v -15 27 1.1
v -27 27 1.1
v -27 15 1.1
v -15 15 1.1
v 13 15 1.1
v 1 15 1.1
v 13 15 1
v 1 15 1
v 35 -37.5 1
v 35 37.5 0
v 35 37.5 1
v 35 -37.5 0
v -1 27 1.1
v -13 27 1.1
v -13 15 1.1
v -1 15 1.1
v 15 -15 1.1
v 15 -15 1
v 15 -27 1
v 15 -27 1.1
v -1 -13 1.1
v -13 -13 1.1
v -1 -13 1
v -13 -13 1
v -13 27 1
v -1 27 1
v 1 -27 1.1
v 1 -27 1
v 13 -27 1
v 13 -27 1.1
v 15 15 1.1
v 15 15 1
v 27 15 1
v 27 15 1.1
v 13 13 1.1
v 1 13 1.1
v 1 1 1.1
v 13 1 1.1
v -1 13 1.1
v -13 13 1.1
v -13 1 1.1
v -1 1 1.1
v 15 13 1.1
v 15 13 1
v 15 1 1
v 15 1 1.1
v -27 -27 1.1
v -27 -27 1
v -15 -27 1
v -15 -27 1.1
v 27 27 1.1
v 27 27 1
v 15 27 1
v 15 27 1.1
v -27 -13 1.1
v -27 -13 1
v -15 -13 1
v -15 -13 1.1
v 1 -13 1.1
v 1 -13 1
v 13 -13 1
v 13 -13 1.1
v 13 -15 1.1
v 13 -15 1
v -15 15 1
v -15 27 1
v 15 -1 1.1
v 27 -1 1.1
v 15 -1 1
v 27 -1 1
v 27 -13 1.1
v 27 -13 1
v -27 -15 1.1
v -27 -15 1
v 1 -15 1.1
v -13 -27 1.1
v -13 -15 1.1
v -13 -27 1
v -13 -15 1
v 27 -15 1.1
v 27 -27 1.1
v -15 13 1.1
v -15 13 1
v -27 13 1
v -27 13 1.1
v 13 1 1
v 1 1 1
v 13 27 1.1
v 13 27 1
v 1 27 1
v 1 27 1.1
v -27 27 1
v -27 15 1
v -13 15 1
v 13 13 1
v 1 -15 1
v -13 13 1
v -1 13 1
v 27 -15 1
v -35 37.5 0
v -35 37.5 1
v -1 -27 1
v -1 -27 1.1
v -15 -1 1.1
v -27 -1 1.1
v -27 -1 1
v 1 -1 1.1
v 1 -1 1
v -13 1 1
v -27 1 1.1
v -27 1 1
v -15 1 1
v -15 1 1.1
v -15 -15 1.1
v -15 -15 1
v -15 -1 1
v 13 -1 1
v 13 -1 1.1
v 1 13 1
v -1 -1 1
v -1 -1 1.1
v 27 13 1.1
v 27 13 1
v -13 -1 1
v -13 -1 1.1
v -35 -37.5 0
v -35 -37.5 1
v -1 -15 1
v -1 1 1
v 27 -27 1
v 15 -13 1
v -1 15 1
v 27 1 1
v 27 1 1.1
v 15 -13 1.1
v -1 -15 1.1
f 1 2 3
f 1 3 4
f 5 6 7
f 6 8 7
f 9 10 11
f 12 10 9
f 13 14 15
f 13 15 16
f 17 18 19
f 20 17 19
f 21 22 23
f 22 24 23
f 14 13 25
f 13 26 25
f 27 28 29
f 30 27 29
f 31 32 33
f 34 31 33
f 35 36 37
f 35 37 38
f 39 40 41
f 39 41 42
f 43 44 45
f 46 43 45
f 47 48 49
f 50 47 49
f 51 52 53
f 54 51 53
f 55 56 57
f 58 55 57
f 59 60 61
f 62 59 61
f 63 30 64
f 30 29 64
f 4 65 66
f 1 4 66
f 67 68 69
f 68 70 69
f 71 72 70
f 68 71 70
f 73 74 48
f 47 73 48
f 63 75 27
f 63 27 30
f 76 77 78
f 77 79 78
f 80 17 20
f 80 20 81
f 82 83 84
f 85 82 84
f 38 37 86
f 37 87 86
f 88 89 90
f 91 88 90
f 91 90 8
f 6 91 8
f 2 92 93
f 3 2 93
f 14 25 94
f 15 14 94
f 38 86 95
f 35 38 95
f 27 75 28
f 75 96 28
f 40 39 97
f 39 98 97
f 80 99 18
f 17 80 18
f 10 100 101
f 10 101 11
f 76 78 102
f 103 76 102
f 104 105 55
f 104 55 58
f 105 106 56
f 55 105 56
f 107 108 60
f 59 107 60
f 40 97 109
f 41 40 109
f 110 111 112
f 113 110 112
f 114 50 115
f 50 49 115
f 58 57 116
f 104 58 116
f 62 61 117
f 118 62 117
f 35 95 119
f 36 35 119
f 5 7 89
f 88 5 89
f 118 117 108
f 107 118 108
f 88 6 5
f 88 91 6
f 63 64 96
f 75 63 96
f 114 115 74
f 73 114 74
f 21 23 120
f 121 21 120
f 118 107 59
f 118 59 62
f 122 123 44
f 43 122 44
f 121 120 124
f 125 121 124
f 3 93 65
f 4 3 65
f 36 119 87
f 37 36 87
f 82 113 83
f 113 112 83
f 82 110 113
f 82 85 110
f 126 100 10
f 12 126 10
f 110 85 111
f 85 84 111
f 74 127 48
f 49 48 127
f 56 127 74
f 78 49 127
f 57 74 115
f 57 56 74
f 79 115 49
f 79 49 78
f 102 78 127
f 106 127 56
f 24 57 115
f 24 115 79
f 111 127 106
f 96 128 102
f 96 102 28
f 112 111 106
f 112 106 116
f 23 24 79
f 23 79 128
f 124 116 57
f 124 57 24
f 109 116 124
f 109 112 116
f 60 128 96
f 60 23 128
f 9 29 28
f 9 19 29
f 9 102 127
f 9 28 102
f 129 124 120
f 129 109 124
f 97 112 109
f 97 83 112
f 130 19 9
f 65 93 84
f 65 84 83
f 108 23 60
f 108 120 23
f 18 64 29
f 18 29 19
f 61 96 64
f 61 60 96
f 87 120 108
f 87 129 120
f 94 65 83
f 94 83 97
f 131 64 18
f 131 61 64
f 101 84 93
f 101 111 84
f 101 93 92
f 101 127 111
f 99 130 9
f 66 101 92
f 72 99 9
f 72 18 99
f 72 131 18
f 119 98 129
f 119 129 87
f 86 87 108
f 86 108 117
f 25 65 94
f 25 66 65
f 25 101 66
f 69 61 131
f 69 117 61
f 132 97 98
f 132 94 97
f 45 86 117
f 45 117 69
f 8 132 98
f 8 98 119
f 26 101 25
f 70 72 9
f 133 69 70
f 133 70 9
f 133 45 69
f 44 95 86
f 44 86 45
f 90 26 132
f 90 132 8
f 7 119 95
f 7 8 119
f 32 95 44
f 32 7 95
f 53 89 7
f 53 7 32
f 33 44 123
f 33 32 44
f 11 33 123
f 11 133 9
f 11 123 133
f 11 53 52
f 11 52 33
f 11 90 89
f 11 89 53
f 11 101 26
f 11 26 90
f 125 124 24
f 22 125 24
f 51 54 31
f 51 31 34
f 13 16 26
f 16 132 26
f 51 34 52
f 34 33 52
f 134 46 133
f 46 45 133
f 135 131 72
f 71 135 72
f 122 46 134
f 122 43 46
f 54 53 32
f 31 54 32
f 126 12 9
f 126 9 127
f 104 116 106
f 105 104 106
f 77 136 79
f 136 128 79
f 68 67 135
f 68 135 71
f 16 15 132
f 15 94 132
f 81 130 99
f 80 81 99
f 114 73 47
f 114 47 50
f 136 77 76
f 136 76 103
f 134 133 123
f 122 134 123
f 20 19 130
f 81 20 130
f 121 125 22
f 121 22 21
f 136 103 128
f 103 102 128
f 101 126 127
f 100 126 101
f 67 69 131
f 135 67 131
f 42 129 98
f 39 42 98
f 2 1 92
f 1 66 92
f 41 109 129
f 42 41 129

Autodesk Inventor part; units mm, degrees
ref_plane "YZ Plane" through (0, 0, 0) normal (1, 0, 0) x (0, 1, 0)
ref_plane "XZ Plane" through (0, 0, 0) normal (0, 1, 0) x (-1, 0, 0)
ref_plane "XY Plane" through (0, 0, 0) normal (0, 0, 1) x (1, 0, 0)
sketch "Boceto1" plane through (0, 0, 0) normal (0, 0, 1) x (1, 0, 0)
  line L0 (-35, 37.5) -> (35, 37.5)
  line L1 (35, 37.5) -> (35, -37.5)
  line L2 (35, -37.5) -> (-35, -37.5)
  line L3 (-35, -37.5) -> (-35, 37.5)
  point P0 (0, 0)
  point P1 (-35, 0)
  point P2 (0, 37.5)
  dimension "d0" = 70
  dimension "d1" = 75
extrude "Extrusión1" add sketch "Boceto1" along normal blind 1
sketch "Boceto2" plane through (0, 0, 1) normal (0, 0, 1) x (1, 0, 0)
  line L0 (-27, -27) -> (-15, -27)
  line L1 (-15, -27) -> (-15, -15)
  line L2 (-15, -15) -> (-27, -15)
  line L3 (-27, -15) -> (-27, -27)
  line L4 (-13, -27) -> (-1, -27)
  line L5 (-1, -27) -> (-1, -15)
  line L6 (-1, -15) -> (-13, -15)
  line L7 (-13, -15) -> (-13, -27)
  line L8 (1, -27) -> (13, -27)
  line L9 (13, -27) -> (13, -15)
  line L10 (13, -15) -> (1, -15)
  line L11 (1, -15) -> (1, -27)
  line L12 (15, -27) -> (27, -27)
  line L13 (27, -27) -> (27, -15)
  line L14 (27, -15) -> (15, -15)
  line L15 (15, -15) -> (15, -27)
  line L16 (-27, -13) -> (-15, -13)
  line L17 (-15, -13) -> (-15, -1)
  line L18 (-15, -1) -> (-27, -1)
  line L19 (-27, -1) -> (-27, -13)
  line L20 (-13, -13) -> (-1, -13)
  line L21 (-1, -13) -> (-1, -1)
  line L22 (-1, -1) -> (-13, -1)
  line L23 (-13, -1) -> (-13, -13)
  line L24 (1, -13) -> (13, -13)
  line L25 (13, -13) -> (13, -1)
  line L26 (13, -1) -> (1, -1)
  line L27 (1, -1) -> (1, -13)
  line L28 (15, -13) -> (27, -13)
  line L29 (27, -13) -> (27, -1)
  line L30 (27, -1) -> (15, -1)
  line L31 (15, -1) -> (15, -13)
  line L32 (-27, 1) -> (-15, 1)
  line L33 (-15, 1) -> (-15, 13)
  line L34 (-15, 13) -> (-27, 13)
  line L35 (-27, 13) -> (-27, 1)
  line L36 (-13, 1) -> (-1, 1)
  line L37 (-1, 1) -> (-1, 13)
  line L38 (-1, 13) -> (-13, 13)
  line L39 (-13, 13) -> (-13, 1)
  line L40 (1, 1) -> (13, 1)
  line L41 (13, 1) -> (13, 13)
  line L42 (13, 13) -> (1, 13)
  line L43 (1, 13) -> (1, 1)
  line L44 (15, 1) -> (27, 1)
  line L45 (27, 1) -> (27, 13)
  line L46 (27, 13) -> (15, 13)
  line L47 (15, 13) -> (15, 1)
  line L48 (-27, 15) -> (-15, 15)
  line L49 (-15, 15) -> (-15, 27)
  line L50 (-15, 27) -> (-27, 27)
  line L51 (-27, 27) -> (-27, 15)
  line L52 (-13, 15) -> (-1, 15)
  line L53 (-1, 15) -> (-1, 27)
  line L54 (-1, 27) -> (-13, 27)
  line L55 (-13, 27) -> (-13, 15)
  line L56 (1, 15) -> (13, 15)
  line L57 (13, 15) -> (13, 27)
  line L58 (13, 27) -> (1, 27)
  line L59 (1, 27) -> (1, 15)
  line L60 (15, 15) -> (27, 15)
  line L61 (27, 15) -> (27, 27)
  line L62 (27, 27) -> (15, 27)
  line L63 (15, 27) -> (15, 15)
  line L64 (-1, -1) -> (1, 1) construction
  point P0 (0, 0)
  point P1 (0, 0)
  dimension "d6" = 14
  dimension "d9" = 14
  dimension "d12" = 12
extrude "Extrusión2" add sketch "Boceto2" along normal blind 0.1
equation "\"d9\" = d6"
properties part number "botonera"
